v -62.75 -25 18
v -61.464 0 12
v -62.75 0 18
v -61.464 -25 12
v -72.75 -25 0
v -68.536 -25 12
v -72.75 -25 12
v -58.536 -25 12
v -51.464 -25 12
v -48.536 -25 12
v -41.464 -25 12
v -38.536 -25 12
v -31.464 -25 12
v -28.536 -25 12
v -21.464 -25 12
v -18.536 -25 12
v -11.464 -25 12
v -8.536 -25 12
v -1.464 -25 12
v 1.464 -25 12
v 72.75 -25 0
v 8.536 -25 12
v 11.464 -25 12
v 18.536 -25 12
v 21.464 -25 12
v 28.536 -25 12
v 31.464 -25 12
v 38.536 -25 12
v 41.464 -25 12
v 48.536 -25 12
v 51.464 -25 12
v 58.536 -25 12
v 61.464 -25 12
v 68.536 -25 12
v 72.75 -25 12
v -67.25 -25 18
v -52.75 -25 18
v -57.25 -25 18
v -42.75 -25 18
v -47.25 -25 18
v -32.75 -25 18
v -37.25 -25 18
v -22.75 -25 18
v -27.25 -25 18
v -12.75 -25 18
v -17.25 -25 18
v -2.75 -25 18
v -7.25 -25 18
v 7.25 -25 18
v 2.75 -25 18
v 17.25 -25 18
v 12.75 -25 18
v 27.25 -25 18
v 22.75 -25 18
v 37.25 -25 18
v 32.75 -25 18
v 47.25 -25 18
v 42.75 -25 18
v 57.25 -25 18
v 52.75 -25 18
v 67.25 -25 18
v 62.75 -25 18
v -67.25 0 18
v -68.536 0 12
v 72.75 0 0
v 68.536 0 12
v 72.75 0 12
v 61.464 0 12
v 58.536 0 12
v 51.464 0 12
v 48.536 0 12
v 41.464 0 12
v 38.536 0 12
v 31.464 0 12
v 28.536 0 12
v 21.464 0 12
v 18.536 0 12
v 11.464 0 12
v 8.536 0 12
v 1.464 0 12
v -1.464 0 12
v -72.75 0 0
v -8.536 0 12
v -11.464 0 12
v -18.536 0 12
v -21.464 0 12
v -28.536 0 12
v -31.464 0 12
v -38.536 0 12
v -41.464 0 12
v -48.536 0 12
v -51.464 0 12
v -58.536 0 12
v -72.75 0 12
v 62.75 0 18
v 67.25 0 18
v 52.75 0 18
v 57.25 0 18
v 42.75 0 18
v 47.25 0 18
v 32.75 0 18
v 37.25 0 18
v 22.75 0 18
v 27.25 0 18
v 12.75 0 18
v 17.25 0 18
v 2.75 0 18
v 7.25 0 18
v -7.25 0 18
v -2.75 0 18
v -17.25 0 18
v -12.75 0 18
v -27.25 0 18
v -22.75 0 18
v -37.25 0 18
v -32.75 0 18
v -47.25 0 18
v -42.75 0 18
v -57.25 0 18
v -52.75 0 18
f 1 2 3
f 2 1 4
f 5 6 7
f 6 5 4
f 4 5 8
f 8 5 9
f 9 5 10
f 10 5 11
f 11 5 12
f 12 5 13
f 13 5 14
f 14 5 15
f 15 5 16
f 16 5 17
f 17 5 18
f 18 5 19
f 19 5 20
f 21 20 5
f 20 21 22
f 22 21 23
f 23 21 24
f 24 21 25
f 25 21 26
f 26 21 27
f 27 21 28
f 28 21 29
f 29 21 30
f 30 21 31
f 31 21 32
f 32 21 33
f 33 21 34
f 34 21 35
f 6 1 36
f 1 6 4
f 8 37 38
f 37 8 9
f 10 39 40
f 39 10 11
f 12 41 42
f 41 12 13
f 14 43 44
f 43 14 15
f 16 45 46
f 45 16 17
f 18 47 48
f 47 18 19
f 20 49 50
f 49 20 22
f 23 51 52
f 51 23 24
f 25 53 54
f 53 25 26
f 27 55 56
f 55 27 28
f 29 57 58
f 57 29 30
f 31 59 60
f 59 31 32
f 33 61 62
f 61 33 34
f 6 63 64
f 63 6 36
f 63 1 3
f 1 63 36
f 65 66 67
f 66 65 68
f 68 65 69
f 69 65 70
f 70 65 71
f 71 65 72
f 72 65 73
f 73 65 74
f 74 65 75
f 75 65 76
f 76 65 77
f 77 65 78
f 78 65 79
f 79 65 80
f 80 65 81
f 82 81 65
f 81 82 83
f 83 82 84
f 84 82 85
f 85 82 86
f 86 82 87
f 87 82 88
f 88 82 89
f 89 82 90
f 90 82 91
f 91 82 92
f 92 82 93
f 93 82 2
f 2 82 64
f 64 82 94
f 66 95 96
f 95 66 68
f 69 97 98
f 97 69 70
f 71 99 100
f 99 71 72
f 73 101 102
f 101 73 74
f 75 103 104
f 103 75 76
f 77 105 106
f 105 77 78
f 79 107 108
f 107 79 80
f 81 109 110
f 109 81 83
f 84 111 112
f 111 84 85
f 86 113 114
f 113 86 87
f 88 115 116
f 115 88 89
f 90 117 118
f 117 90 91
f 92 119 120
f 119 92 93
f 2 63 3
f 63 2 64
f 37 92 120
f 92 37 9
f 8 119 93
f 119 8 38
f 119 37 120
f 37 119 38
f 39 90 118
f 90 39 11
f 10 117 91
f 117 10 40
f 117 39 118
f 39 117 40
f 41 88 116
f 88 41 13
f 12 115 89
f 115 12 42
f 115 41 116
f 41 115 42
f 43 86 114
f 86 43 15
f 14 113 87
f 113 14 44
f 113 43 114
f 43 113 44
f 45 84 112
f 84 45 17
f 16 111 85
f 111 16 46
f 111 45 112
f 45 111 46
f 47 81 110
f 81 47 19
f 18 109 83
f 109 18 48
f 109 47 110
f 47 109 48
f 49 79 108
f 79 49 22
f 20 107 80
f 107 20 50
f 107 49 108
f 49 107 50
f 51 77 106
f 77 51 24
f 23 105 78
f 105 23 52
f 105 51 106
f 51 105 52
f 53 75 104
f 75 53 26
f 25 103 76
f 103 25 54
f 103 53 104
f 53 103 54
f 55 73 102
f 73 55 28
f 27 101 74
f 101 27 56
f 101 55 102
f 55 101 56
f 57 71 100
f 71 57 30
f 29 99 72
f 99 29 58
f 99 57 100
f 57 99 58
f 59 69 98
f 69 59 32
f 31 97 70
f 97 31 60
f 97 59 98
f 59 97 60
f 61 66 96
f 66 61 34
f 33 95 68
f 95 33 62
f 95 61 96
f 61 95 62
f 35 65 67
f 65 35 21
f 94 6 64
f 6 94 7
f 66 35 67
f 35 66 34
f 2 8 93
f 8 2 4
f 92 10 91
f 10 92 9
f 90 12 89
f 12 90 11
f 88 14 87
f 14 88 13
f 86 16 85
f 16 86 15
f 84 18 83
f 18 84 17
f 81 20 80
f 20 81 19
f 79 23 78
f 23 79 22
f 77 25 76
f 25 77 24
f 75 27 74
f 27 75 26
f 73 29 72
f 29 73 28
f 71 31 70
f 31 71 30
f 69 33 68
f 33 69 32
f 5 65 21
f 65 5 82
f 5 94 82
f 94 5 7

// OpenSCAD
$fn = 32;

// ----------------------------------------------------------------------
// Toothed rack, 14 teeth
// 10 mm pitch, 6 mm teeth
// ----------------------------------------------------------------------

// --- parameters (mm) ---
bar_w = 25;     // bar width (Y)
bar_h = 12;     // bar height (Z)
teeth = 14;     // number of teeth
pitch = 10;     // tooth pitch
tooth_h = 6;    // tooth height above the bar
root_w = 7.5;   // tooth width at the root
crest_w = 4.5;  // tooth width at the crest

// --- derived feature positions (mm) ---
span = (teeth - 1) * pitch;  // = 130   distance between the outer teeth
bar_l = span + root_w + 8;   // = 145.5   bar length: teeth plus 4 mm at each end
tooth_x = -span / 2;         // = -65   X of the first tooth
height = bar_h + tooth_h;    // = 18   overall height
feature_centers = [
  [tooth_x + 0 * pitch, -bar_w / 2],
  [tooth_x + 1 * pitch, -bar_w / 2],
  [tooth_x + 2 * pitch, -bar_w / 2],
  [tooth_x + 3 * pitch, -bar_w / 2],
  [tooth_x + 4 * pitch, -bar_w / 2],
  [tooth_x + 5 * pitch, -bar_w / 2],
  [tooth_x + 6 * pitch, -bar_w / 2],
  [tooth_x + 7 * pitch, -bar_w / 2],
  [tooth_x + 8 * pitch, -bar_w / 2],
  [tooth_x + 9 * pitch, -bar_w / 2],
  [tooth_x + 10 * pitch, -bar_w / 2],
  [tooth_x + 11 * pitch, -bar_w / 2],
  [tooth_x + 12 * pitch, -bar_w / 2],
  [tooth_x + 13 * pitch, -bar_w / 2]
];   // tooth centre line, drives the tooth loop

// bar with a rack of teeth, one extruded trapezoium per centre
module rack_tooth() {
  linear_extrude(height = bar_w)
    polygon(points = [
      [0, 0],
      [root_w, 0],
      [root_w / 2 + crest_w / 2, tooth_h + 1],
      [root_w / 2 - crest_w / 2, tooth_h + 1]
    ]);
}

union() {
  translate([-bar_l / 2, -bar_w, 0]) cube([bar_l, bar_w, bar_h]);
  for (centre = feature_centers)
    translate([centre[0] - root_w / 2, 0, bar_h - 1]) rotate([90, 0, 0]) rack_tooth();
}
